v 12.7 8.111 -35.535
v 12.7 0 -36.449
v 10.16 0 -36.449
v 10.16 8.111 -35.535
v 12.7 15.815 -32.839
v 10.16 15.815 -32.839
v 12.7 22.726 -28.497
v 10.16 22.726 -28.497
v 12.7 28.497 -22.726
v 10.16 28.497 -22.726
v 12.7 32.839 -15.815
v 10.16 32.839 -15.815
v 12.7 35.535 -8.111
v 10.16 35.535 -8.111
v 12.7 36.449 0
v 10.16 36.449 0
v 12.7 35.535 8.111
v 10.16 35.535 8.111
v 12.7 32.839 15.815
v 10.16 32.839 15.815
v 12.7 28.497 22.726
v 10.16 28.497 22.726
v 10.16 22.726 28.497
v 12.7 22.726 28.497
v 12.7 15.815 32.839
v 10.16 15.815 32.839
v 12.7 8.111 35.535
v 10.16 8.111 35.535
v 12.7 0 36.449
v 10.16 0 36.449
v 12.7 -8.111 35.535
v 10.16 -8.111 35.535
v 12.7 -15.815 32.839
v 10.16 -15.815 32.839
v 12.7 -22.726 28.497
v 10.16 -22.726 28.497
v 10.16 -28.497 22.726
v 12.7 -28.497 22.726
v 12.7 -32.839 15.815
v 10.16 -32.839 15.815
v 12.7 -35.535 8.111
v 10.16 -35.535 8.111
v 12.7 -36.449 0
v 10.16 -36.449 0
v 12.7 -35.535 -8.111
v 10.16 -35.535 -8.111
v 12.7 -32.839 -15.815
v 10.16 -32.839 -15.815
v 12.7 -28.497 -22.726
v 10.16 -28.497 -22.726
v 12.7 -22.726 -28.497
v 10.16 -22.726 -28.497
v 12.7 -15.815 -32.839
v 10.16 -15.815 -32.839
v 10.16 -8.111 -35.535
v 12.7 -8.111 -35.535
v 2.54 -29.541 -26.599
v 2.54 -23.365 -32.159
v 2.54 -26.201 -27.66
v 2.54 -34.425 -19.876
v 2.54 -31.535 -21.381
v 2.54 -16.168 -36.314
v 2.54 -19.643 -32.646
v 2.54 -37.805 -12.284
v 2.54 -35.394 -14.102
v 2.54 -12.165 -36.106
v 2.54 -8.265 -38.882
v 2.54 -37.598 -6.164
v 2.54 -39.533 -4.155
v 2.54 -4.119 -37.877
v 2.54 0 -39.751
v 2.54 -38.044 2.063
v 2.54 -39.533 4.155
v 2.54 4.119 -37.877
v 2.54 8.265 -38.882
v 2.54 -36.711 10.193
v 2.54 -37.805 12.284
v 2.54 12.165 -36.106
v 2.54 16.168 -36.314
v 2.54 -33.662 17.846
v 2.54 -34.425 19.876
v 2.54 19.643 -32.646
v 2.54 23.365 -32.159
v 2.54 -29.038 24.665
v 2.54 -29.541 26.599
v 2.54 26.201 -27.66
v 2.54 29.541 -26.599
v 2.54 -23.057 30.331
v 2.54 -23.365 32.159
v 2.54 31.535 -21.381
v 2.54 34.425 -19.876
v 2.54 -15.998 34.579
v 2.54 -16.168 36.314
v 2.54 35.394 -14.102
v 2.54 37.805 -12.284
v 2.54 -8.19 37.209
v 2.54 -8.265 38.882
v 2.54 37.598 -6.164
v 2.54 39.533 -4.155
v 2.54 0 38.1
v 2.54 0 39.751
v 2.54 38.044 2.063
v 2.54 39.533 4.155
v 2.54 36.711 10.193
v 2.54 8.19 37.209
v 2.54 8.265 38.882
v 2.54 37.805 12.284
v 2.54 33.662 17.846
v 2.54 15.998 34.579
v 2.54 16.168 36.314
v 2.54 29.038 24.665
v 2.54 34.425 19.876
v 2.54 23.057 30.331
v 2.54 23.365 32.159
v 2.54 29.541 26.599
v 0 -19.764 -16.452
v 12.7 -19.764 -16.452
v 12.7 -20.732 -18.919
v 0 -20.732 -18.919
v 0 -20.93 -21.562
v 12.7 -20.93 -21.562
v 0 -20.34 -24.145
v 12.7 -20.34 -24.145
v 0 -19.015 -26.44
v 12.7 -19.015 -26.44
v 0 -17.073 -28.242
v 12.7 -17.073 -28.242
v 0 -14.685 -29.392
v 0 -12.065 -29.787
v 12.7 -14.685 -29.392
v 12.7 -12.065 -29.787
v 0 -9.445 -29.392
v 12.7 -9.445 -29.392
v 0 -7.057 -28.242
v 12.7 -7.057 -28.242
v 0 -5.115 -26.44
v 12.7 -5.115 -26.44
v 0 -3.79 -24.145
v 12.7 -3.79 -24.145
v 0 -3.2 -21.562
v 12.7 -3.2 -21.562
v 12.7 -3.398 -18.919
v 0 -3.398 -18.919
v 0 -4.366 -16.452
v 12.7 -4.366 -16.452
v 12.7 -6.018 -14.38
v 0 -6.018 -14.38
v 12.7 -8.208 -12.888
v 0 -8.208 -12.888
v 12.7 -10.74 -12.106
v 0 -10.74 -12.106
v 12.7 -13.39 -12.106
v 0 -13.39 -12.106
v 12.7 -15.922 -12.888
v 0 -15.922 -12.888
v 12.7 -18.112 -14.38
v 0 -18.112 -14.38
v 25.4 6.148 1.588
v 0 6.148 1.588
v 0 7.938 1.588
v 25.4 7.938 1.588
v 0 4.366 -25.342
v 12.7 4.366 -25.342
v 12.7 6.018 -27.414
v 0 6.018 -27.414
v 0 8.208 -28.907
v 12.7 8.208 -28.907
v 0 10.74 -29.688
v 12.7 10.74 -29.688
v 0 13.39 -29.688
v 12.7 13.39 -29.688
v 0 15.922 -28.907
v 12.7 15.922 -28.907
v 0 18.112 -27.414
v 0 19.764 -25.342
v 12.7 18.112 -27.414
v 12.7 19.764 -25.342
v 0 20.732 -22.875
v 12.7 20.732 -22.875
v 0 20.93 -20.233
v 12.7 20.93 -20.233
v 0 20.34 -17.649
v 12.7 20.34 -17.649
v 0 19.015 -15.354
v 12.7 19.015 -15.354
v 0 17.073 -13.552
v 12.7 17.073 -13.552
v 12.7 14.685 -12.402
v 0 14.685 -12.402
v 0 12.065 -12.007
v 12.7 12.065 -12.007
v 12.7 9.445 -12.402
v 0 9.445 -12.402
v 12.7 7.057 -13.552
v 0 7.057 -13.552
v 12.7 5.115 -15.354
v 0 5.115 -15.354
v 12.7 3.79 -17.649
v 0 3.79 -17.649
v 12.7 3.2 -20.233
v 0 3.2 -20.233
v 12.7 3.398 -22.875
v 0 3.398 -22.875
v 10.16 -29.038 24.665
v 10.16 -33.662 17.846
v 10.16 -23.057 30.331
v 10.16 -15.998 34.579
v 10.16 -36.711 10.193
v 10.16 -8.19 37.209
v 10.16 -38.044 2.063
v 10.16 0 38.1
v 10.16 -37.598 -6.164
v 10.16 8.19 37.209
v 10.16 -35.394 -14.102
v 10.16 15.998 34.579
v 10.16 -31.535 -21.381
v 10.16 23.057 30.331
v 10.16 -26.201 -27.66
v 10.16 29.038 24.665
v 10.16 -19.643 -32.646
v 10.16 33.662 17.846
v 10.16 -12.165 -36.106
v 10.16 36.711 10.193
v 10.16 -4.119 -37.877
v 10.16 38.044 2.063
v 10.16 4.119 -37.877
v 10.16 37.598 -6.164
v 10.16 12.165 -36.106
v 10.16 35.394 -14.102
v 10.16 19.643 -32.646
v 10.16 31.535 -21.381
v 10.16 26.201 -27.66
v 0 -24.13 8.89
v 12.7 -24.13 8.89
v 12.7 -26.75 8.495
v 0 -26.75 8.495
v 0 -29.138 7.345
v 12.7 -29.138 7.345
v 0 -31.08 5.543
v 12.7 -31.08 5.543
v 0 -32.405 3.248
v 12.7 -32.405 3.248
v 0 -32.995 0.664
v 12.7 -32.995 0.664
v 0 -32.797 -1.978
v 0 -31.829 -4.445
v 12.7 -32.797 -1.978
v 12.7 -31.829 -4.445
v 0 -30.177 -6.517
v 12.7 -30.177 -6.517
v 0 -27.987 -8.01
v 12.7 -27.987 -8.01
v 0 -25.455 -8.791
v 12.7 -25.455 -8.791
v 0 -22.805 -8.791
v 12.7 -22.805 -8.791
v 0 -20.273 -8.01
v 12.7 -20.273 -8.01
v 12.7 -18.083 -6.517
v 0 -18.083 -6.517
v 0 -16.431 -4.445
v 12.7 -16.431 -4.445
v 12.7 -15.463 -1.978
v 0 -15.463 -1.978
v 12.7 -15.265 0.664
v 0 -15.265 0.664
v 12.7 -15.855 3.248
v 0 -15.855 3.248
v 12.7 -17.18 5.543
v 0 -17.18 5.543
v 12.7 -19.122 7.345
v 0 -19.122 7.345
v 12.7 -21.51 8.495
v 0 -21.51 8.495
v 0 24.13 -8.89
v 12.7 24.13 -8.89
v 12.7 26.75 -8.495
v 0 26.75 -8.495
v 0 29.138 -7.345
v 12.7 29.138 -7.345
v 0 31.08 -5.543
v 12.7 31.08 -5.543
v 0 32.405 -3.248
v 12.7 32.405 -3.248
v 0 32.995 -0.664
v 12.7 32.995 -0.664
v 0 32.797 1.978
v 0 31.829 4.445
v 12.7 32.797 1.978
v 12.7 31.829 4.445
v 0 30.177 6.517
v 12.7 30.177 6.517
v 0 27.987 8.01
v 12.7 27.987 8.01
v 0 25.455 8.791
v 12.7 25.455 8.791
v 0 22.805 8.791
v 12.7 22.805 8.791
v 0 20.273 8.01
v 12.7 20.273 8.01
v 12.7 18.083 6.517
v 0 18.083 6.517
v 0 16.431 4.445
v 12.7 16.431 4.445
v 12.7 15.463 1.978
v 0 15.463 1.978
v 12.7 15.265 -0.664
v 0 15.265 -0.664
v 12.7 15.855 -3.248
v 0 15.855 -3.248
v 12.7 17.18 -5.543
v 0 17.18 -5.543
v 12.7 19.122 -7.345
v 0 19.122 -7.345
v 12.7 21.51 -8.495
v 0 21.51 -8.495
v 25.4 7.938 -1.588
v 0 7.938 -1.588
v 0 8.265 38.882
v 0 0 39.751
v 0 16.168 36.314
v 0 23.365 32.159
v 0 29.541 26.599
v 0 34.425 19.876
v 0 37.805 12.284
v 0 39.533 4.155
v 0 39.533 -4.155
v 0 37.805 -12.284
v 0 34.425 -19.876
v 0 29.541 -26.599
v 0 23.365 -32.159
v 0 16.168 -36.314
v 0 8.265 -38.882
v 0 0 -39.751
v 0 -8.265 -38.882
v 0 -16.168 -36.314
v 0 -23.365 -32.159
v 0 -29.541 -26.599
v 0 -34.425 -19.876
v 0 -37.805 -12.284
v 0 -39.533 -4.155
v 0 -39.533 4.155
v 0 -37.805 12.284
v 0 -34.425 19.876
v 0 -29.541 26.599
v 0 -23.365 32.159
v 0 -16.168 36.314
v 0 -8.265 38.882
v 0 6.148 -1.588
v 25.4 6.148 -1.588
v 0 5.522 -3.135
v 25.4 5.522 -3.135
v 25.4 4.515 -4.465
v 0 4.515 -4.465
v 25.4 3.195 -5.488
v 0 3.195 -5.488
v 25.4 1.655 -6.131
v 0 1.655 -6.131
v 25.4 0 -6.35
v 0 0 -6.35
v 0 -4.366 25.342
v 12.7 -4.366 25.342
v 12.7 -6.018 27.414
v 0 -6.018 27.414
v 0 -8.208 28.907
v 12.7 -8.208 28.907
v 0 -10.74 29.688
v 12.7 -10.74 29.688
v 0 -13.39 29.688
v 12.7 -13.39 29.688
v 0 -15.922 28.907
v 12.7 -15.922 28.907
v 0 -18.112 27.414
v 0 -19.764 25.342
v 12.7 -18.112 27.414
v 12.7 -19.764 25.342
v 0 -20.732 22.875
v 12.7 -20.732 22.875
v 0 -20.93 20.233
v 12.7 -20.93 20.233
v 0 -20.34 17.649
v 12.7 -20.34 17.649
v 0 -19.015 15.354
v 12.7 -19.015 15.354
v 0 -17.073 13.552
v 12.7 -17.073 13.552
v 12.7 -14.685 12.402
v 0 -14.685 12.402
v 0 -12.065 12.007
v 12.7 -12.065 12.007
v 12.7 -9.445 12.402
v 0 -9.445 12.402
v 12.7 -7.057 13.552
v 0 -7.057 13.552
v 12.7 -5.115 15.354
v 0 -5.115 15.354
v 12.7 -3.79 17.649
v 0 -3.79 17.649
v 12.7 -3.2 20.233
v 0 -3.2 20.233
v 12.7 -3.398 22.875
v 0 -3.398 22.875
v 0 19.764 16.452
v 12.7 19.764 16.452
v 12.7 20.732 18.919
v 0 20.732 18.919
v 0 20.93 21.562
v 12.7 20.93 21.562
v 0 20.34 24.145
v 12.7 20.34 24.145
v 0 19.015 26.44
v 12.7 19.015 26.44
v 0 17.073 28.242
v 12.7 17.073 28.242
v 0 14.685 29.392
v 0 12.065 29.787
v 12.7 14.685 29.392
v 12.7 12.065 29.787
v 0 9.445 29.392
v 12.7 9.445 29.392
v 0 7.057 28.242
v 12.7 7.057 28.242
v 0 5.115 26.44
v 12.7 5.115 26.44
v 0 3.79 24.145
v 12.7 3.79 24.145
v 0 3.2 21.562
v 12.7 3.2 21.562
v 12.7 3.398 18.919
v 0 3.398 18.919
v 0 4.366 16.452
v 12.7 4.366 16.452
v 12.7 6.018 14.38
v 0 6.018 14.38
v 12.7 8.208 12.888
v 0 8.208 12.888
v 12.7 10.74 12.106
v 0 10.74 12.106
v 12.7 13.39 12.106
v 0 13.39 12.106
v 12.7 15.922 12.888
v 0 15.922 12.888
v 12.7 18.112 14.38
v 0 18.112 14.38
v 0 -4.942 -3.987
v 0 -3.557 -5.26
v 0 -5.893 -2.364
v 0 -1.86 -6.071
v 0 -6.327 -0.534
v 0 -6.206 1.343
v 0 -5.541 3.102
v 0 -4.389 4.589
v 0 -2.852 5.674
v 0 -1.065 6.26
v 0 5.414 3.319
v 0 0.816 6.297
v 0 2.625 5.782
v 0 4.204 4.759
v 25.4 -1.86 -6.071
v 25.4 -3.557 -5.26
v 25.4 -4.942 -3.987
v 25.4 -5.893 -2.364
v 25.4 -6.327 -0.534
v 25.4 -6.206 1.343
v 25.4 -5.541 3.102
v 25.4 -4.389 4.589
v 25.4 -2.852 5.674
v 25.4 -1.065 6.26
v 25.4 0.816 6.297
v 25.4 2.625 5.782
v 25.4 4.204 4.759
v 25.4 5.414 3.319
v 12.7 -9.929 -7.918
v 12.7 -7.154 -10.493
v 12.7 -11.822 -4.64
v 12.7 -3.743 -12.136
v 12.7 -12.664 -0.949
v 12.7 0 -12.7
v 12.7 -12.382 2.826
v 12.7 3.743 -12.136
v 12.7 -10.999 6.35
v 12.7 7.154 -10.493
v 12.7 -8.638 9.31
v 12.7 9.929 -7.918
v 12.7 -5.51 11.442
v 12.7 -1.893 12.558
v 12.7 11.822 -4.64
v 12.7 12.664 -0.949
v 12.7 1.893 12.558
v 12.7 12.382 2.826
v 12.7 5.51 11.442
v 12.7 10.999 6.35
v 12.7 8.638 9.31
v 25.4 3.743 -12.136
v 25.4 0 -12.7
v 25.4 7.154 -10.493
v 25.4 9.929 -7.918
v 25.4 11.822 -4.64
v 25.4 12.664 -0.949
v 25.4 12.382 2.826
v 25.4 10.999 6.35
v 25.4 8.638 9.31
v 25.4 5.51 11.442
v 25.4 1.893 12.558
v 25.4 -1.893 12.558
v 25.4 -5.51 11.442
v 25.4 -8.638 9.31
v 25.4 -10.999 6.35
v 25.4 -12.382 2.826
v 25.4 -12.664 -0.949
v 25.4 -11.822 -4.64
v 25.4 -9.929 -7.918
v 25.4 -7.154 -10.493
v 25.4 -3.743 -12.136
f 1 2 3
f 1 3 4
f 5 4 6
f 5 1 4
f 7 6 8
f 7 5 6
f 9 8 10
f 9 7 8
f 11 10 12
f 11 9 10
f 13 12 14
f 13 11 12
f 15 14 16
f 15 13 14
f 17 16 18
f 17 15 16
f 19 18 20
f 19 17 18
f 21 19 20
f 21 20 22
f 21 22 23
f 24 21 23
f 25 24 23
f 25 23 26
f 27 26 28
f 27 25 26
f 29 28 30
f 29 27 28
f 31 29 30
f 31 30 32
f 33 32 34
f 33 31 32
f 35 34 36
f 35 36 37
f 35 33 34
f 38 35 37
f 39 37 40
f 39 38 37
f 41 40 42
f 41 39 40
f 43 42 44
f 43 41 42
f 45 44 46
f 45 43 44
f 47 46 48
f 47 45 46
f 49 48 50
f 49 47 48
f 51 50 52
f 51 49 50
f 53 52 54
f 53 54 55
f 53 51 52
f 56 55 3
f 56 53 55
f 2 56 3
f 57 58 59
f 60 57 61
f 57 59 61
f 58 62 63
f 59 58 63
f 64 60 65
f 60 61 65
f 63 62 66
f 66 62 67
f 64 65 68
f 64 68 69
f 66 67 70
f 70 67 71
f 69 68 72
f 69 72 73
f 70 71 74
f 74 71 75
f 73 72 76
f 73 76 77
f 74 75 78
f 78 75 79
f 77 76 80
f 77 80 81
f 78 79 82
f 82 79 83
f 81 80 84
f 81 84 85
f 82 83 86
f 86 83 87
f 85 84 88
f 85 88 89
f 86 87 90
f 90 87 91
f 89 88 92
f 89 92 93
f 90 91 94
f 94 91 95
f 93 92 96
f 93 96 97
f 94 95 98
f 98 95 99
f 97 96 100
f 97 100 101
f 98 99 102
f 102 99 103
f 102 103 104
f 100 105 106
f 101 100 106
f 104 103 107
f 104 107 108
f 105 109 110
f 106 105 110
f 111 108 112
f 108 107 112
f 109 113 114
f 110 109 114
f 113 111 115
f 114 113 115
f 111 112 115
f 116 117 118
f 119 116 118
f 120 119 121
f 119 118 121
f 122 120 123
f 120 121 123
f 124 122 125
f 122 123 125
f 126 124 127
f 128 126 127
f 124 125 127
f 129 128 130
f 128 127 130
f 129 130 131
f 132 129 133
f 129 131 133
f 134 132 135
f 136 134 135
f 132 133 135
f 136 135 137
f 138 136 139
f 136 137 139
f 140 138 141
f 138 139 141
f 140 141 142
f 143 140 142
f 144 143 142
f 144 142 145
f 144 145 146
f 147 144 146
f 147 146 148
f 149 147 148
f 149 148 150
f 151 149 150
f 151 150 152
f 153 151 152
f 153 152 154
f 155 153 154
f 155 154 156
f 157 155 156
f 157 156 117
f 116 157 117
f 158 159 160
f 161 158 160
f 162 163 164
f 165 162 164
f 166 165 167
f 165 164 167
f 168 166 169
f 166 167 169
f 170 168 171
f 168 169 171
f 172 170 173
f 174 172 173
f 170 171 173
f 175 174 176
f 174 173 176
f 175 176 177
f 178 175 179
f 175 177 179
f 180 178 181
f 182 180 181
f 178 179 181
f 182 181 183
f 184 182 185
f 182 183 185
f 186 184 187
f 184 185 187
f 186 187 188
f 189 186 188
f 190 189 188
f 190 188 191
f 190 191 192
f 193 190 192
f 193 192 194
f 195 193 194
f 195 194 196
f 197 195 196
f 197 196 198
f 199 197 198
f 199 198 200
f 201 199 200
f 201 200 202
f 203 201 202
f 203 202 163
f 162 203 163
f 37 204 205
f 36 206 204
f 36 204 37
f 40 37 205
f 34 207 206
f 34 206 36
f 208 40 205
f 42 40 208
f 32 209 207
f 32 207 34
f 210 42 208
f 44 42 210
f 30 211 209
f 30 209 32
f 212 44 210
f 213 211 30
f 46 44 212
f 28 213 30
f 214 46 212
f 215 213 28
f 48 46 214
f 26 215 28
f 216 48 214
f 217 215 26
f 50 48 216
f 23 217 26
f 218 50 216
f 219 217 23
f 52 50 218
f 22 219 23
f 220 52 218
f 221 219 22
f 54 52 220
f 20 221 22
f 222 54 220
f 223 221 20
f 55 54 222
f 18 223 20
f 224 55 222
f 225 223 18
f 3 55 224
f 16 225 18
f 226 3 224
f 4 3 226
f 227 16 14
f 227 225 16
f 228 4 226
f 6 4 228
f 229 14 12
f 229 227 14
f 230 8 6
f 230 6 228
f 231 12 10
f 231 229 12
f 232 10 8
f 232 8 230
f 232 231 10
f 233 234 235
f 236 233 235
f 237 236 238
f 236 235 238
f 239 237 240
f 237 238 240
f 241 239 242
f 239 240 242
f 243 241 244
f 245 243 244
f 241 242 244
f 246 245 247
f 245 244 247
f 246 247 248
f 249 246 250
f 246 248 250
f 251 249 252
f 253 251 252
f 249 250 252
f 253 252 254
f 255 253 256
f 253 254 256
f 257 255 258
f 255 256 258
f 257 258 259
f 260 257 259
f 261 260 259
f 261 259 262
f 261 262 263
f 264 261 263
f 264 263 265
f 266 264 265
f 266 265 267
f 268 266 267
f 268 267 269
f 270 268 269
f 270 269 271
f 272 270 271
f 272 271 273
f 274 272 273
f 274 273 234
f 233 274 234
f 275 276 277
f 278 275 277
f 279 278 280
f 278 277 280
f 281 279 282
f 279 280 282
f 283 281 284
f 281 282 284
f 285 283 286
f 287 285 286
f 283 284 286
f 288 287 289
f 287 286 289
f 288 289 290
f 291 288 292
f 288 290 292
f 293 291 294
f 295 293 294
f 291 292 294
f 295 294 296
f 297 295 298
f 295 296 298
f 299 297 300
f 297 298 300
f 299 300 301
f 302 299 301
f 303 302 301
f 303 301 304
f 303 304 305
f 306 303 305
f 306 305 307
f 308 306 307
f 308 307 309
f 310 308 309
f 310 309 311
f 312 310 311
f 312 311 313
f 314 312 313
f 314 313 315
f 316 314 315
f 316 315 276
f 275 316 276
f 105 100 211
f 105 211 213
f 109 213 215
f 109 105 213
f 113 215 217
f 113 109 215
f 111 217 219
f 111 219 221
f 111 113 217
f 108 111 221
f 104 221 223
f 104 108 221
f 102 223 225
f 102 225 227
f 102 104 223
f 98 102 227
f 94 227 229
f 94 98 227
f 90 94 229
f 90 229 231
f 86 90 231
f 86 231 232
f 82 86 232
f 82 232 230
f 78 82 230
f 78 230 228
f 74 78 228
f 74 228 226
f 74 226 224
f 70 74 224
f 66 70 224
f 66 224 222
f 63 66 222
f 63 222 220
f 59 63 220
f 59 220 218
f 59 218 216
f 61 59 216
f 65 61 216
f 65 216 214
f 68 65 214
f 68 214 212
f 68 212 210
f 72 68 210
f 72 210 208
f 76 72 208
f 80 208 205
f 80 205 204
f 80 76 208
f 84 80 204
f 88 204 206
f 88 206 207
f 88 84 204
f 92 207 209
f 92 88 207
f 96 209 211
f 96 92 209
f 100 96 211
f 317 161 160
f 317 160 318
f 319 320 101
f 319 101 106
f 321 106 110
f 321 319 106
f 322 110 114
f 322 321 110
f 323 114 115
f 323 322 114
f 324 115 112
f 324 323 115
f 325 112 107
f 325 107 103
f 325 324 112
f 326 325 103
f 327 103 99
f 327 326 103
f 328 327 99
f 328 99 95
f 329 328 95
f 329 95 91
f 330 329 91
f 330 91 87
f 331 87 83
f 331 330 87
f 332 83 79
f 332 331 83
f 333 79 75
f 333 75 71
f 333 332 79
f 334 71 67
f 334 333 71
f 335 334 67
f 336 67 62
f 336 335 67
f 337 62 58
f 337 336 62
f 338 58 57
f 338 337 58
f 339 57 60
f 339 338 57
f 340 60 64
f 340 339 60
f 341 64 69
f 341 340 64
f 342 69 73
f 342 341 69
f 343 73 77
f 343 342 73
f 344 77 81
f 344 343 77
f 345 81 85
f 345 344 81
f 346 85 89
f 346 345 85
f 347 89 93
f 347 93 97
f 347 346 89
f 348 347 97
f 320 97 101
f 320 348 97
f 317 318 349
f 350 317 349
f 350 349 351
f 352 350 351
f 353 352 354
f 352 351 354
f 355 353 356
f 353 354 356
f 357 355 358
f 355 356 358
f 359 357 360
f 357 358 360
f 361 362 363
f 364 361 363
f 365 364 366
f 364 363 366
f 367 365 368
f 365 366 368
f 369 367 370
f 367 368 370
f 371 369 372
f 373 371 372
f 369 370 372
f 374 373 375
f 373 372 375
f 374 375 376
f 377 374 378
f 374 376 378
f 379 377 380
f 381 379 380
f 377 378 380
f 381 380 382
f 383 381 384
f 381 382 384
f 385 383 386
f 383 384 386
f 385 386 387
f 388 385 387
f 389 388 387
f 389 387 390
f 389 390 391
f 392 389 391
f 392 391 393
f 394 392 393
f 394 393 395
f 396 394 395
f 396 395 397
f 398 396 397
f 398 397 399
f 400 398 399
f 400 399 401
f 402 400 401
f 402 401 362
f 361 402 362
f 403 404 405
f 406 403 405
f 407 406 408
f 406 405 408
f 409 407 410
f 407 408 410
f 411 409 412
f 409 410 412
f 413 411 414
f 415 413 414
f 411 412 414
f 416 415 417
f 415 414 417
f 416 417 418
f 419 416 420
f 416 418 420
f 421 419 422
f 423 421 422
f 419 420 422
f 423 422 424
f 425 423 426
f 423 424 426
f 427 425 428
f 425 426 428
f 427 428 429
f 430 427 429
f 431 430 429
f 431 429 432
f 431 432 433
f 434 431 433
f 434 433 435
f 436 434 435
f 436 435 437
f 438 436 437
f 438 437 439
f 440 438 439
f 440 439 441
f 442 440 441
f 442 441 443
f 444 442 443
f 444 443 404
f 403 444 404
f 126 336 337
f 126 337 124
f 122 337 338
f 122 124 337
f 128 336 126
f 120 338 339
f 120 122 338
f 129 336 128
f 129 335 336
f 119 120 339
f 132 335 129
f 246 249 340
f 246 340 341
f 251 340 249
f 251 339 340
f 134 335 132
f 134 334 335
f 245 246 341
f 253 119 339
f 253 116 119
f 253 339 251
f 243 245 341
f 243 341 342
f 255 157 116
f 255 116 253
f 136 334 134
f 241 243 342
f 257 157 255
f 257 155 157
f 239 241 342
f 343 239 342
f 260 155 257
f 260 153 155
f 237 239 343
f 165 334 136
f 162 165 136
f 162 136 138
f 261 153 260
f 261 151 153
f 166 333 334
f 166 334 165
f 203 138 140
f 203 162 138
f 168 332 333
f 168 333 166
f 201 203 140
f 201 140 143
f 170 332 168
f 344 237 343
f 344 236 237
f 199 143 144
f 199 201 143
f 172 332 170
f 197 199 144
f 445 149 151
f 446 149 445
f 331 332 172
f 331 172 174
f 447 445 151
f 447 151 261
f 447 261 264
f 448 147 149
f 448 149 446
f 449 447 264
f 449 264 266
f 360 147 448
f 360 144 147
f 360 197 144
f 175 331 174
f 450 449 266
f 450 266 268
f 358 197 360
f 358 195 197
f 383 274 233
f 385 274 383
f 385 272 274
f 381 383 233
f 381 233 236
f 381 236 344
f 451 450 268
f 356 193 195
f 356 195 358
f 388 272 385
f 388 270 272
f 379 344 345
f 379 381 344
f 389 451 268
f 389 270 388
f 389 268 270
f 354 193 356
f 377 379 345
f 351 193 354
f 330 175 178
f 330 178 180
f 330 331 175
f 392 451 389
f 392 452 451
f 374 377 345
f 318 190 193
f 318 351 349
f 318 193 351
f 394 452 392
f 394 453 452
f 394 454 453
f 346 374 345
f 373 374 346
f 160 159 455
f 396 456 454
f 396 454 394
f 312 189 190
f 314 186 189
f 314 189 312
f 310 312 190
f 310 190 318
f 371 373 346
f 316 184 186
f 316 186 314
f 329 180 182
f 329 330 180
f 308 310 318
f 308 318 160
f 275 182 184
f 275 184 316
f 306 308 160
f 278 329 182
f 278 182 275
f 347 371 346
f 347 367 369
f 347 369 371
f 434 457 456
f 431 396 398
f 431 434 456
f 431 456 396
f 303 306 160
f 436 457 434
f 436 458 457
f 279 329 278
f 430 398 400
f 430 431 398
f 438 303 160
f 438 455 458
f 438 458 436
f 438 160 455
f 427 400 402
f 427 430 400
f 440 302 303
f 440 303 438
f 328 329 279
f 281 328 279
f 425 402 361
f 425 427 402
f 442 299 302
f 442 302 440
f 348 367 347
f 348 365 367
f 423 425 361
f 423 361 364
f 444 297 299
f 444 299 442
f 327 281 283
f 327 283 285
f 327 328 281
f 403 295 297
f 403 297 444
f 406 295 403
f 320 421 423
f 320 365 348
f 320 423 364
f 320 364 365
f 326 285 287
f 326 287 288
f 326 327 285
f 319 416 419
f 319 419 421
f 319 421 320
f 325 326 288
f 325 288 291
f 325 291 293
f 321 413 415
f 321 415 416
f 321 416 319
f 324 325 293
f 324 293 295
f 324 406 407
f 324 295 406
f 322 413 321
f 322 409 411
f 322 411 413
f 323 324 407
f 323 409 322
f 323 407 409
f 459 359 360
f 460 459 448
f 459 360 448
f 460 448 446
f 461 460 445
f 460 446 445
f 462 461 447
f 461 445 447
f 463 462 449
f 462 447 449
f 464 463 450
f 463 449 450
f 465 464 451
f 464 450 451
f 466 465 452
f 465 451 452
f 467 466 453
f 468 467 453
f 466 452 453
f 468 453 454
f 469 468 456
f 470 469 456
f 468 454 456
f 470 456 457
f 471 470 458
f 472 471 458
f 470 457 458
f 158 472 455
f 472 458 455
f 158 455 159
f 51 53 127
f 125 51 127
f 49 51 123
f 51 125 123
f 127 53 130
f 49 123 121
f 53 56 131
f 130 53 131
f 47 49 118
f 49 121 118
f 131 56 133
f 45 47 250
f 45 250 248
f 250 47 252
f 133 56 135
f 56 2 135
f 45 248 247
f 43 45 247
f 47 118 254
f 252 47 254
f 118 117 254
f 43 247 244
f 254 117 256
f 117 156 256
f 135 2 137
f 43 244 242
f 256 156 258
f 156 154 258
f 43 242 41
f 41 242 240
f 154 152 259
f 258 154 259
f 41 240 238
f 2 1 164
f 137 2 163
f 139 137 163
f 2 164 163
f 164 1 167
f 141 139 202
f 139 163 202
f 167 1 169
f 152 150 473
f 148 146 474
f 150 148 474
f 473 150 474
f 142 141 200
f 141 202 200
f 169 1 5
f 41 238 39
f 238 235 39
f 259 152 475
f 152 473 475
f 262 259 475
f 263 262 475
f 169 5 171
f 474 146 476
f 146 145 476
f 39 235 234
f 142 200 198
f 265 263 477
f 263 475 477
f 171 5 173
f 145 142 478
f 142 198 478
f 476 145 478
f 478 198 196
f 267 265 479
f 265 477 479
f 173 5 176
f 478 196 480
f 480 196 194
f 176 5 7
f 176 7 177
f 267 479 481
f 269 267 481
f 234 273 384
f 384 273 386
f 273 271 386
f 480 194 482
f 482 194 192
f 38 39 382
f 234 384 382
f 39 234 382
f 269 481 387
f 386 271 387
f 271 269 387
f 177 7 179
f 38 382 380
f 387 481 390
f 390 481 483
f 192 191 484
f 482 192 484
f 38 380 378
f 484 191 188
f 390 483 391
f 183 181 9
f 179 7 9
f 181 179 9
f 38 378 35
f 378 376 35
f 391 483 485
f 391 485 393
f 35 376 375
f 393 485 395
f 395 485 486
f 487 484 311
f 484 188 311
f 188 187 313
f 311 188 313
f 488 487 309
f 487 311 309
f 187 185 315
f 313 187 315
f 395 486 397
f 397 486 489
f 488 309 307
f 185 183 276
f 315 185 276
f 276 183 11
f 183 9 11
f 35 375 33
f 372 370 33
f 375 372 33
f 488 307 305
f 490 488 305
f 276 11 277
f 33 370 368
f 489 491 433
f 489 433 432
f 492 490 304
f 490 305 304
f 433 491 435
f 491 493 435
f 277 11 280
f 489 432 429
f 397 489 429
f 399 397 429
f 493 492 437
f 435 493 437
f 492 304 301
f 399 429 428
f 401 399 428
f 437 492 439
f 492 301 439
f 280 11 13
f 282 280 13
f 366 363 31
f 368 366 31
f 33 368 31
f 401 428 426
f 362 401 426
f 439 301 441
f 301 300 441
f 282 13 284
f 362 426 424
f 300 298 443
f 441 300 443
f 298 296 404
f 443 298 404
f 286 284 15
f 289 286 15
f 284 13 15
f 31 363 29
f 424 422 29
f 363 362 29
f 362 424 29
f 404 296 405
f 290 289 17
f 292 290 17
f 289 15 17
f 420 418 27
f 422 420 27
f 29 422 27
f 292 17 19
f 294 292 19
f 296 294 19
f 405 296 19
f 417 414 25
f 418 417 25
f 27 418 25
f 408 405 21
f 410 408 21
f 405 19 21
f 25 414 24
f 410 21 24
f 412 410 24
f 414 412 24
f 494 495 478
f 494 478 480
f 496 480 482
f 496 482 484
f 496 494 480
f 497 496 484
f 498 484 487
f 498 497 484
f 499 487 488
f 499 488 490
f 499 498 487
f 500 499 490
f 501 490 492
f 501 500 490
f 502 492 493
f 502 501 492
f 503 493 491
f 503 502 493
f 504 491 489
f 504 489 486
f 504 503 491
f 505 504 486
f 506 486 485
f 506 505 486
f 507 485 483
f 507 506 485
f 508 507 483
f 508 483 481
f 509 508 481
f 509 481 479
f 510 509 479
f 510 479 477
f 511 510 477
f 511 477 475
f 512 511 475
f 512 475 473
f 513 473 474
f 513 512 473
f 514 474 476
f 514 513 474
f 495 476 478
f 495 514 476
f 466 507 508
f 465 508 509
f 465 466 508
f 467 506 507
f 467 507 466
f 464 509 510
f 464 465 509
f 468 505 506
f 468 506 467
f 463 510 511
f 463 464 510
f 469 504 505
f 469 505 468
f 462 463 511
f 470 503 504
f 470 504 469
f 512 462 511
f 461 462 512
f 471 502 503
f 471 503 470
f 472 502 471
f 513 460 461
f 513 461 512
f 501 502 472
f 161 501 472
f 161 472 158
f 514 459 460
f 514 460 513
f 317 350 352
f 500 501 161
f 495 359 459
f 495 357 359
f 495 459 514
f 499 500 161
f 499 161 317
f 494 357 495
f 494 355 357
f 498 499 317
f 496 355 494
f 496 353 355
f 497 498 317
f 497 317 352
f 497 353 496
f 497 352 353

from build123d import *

# Parameters (mm, degrees)
SKETCH1_R           = 25.4
BOSS_EXTRUDE1_DEPTH = 25.4
SKETCH2_R           = 38.1
SKETCH2_R_2         = 10.9140625
BOSS_EXTRUDE2_DEPTH = 12.7
SKETCH3_R           = 25.4
SKETCH3_R_2         = 12.7
CUT_EXTRUDE1_DEPTH  = 12.7
SKETCH4_R           = 8.89
CUT_EXTRUDE2_DEPTH  = 13.7
CIRPATTERN1_COUNT   = 6
SKETCH5_R           = 39.751
SKETCH5_R_2         = 38.1
BOSS_EXTRUDE3_DEPTH = 2.54
SKETCH6_R           = 38.1
SKETCH6_R_2         = 36.449
CUT_EXTRUDE3_DEPTH  = 2.54


with BuildPart() as part:
    # Sketch1 → Boss-Extrude1 (new body)
    with BuildSketch(Plane(origin=(0, 0, 0), x_dir=(0, 0, -1), z_dir=(1, 0, 0))):
        Circle(SKETCH1_R)
        with BuildLine():
            Line((-1.5875, 6.148361062), (-1.5875, 7.9375))
            Line((-1.5875, 7.9375), (1.5875, 7.9375))
            Line((1.5875, 7.9375), (1.5875, 6.148361062))
            ThreePointArc((1.5875, 6.148361062), (5.020115786, 3.888564967), (6.35, 0))
            ThreePointArc((6.35, 0), (-3.888564967, -5.020115786), (-1.5875, 6.148361062))
        make_face(mode=Mode.SUBTRACT)
    extrude(amount=BOSS_EXTRUDE1_DEPTH)

    # Sketch2 → Boss-Extrude2 (add)
    with BuildSketch(Plane.ZY):
        Circle(SKETCH2_R)
        Circle(SKETCH2_R_2, mode=Mode.SUBTRACT)
    extrude(amount=-BOSS_EXTRUDE2_DEPTH)

    # Sketch3 → Cut-Extrude1 (cut)
    with BuildSketch(Plane(origin=(25.4, 0, 0), x_dir=(0, 0, -1), z_dir=(1, 0, 0))):
        Circle(SKETCH3_R)
        Circle(SKETCH3_R_2, mode=Mode.SUBTRACT)
    extrude(amount=-CUT_EXTRUDE1_DEPTH, mode=Mode.SUBTRACT)

    # Sketch4 → Cut-Extrude2 (cut, through all)
    with BuildSketch(Plane(origin=(12.7, 0, 0), x_dir=(0, 0, -1), z_dir=(1, 0, 0))):
        with Locations((0, 24.13)):
            Circle(SKETCH4_R)
    cut_extrude2 = extrude(amount=-CUT_EXTRUDE2_DEPTH, mode=Mode.SUBTRACT)

    # CirPattern1: Cut-Extrude2 ×6 about axis
    cirpattern1_axis = Axis((0, 0, 0), (1, 0, 0))
    for i in range(1, CIRPATTERN1_COUNT):
        add(cut_extrude2.rotate(cirpattern1_axis, i * 360 / CIRPATTERN1_COUNT), mode=Mode.SUBTRACT)

    # Sketch5 → Boss-Extrude3 (add)
    with BuildSketch(Plane.ZY):
        Circle(SKETCH5_R)
        Circle(SKETCH5_R_2, mode=Mode.SUBTRACT)
    extrude(amount=-BOSS_EXTRUDE3_DEPTH)

    # Sketch6 → Cut-Extrude3 (cut)
    with BuildSketch(Plane(origin=(12.7, 0, 0), x_dir=(0, 0, -1), z_dir=(1, 0, 0))):
        Circle(SKETCH6_R)
        Circle(SKETCH6_R_2, mode=Mode.SUBTRACT)
    extrude(amount=-CUT_EXTRUDE3_DEPTH, mode=Mode.SUBTRACT)


solid = part.part
